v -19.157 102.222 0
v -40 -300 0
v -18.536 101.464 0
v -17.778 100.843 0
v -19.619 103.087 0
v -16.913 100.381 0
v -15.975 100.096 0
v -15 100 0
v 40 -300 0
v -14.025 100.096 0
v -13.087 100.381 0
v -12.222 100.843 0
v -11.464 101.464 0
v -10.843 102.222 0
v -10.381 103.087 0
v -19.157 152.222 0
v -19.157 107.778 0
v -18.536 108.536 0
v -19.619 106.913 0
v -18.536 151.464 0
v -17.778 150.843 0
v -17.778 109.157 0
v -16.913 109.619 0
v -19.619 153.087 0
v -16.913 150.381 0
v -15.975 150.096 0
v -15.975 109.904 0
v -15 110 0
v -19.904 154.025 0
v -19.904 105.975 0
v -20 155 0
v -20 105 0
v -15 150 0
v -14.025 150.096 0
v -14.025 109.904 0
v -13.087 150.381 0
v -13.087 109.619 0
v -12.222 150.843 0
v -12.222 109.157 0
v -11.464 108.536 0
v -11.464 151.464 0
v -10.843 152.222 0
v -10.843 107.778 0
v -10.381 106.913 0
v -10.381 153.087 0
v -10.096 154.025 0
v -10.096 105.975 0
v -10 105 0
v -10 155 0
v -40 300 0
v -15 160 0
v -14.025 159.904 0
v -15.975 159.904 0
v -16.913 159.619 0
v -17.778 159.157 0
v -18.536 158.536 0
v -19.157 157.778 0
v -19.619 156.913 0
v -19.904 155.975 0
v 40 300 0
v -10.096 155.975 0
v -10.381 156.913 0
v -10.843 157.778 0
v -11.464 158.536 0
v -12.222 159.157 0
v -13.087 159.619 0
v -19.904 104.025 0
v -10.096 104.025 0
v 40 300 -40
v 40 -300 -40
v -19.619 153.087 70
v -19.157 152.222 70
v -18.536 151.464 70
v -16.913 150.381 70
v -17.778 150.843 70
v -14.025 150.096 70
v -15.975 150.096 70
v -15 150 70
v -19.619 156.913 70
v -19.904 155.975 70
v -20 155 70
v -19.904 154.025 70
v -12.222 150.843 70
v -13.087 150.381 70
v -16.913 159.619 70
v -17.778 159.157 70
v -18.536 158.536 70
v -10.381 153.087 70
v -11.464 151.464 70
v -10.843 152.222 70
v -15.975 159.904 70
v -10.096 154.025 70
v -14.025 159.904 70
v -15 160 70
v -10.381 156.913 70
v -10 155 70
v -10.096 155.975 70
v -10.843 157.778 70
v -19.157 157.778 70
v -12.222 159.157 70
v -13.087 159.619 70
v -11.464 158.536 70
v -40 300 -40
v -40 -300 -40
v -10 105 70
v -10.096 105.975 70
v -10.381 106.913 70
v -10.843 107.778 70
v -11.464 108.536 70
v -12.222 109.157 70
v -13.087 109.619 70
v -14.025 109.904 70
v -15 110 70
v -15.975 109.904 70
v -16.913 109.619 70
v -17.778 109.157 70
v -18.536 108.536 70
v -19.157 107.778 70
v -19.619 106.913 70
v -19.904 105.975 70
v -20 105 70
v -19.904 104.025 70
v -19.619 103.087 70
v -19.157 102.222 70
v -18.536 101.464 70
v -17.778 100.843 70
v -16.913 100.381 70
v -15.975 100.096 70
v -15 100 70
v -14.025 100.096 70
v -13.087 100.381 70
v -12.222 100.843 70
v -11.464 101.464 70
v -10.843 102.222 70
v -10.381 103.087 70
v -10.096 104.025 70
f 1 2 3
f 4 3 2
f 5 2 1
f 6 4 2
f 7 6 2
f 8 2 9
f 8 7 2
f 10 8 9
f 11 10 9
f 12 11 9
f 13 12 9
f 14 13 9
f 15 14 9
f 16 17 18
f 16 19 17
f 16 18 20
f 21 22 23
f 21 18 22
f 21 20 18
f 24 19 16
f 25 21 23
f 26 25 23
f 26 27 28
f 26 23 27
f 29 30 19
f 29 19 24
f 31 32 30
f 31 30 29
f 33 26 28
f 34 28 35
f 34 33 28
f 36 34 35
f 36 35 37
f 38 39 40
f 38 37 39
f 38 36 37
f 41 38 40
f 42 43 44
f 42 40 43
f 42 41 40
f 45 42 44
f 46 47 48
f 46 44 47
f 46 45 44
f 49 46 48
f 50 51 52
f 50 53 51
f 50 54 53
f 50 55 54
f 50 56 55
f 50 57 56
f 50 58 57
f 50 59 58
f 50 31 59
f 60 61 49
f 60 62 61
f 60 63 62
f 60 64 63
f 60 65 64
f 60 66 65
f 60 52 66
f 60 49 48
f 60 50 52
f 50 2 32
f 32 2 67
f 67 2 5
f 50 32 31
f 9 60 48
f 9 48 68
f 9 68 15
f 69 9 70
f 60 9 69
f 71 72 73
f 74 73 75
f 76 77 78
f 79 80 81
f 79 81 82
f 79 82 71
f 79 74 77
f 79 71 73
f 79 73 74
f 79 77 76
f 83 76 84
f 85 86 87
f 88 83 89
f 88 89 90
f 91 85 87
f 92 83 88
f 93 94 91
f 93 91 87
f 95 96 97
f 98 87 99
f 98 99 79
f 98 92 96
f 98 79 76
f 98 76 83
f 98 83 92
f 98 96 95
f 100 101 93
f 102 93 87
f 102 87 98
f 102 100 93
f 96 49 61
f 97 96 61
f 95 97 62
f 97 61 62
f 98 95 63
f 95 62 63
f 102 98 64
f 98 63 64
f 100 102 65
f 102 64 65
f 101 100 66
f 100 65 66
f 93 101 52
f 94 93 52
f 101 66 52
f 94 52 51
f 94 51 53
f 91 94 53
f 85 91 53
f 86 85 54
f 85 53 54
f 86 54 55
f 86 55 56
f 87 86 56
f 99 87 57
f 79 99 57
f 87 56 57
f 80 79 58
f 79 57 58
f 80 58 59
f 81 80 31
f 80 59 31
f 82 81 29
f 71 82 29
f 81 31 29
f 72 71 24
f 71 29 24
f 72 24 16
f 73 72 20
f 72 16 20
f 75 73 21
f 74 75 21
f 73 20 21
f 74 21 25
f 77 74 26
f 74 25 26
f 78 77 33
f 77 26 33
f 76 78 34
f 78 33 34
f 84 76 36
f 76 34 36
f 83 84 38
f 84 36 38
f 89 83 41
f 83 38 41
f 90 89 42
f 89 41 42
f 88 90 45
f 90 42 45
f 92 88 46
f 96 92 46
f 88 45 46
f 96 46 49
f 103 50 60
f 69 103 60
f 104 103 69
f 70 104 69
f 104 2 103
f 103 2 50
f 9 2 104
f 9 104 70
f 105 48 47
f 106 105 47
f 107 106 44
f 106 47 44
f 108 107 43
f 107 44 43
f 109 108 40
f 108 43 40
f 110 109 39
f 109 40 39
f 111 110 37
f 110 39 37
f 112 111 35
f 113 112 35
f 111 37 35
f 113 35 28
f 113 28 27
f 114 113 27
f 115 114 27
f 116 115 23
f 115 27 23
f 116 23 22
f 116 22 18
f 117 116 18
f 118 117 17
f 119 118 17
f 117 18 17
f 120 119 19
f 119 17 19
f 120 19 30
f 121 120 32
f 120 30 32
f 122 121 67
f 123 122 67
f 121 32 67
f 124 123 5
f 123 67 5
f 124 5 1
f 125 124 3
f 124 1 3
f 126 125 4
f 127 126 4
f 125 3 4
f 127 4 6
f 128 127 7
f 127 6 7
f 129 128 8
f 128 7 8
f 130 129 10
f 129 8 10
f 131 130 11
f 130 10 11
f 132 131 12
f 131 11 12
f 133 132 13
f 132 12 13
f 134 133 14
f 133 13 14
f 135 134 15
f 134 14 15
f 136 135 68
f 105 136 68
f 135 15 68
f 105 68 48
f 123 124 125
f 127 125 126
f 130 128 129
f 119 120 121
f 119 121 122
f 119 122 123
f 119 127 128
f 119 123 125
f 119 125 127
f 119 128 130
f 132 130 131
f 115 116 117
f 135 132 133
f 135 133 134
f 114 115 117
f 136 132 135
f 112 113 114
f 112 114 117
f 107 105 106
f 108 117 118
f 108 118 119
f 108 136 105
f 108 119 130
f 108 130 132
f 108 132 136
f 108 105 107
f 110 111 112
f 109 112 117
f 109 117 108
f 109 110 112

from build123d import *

# Parameters (mm, degrees)
F0_W     = 80
F0_H     = 600
F0_R     = 5
F1_DEPTH = 40
F2_DEPTH = 70


with BuildPart() as f1:
    # F0 (on Top) → F1 (new body)
    with BuildSketch(Plane.XY):
        Rectangle(F0_W, F0_H)
        with Locations((-15, 105)):
            Circle(F0_R, mode=Mode.SUBTRACT)
        with Locations((-15, 155)):
            Circle(F0_R, mode=Mode.SUBTRACT)
        with Locations((-15, 155)):
            Circle(F0_R)
        with Locations((-15, 105)):
            Circle(F0_R)
    extrude(amount=-F1_DEPTH)

    # F0 (on Top) → F2 (join)
    with BuildSketch(Plane.XY):
        with Locations((-15, 155)):
            Circle(F0_R)
        with Locations((-15, 105)):
            Circle(F0_R)
    extrude(amount=F2_DEPTH)


solid = f1.part
